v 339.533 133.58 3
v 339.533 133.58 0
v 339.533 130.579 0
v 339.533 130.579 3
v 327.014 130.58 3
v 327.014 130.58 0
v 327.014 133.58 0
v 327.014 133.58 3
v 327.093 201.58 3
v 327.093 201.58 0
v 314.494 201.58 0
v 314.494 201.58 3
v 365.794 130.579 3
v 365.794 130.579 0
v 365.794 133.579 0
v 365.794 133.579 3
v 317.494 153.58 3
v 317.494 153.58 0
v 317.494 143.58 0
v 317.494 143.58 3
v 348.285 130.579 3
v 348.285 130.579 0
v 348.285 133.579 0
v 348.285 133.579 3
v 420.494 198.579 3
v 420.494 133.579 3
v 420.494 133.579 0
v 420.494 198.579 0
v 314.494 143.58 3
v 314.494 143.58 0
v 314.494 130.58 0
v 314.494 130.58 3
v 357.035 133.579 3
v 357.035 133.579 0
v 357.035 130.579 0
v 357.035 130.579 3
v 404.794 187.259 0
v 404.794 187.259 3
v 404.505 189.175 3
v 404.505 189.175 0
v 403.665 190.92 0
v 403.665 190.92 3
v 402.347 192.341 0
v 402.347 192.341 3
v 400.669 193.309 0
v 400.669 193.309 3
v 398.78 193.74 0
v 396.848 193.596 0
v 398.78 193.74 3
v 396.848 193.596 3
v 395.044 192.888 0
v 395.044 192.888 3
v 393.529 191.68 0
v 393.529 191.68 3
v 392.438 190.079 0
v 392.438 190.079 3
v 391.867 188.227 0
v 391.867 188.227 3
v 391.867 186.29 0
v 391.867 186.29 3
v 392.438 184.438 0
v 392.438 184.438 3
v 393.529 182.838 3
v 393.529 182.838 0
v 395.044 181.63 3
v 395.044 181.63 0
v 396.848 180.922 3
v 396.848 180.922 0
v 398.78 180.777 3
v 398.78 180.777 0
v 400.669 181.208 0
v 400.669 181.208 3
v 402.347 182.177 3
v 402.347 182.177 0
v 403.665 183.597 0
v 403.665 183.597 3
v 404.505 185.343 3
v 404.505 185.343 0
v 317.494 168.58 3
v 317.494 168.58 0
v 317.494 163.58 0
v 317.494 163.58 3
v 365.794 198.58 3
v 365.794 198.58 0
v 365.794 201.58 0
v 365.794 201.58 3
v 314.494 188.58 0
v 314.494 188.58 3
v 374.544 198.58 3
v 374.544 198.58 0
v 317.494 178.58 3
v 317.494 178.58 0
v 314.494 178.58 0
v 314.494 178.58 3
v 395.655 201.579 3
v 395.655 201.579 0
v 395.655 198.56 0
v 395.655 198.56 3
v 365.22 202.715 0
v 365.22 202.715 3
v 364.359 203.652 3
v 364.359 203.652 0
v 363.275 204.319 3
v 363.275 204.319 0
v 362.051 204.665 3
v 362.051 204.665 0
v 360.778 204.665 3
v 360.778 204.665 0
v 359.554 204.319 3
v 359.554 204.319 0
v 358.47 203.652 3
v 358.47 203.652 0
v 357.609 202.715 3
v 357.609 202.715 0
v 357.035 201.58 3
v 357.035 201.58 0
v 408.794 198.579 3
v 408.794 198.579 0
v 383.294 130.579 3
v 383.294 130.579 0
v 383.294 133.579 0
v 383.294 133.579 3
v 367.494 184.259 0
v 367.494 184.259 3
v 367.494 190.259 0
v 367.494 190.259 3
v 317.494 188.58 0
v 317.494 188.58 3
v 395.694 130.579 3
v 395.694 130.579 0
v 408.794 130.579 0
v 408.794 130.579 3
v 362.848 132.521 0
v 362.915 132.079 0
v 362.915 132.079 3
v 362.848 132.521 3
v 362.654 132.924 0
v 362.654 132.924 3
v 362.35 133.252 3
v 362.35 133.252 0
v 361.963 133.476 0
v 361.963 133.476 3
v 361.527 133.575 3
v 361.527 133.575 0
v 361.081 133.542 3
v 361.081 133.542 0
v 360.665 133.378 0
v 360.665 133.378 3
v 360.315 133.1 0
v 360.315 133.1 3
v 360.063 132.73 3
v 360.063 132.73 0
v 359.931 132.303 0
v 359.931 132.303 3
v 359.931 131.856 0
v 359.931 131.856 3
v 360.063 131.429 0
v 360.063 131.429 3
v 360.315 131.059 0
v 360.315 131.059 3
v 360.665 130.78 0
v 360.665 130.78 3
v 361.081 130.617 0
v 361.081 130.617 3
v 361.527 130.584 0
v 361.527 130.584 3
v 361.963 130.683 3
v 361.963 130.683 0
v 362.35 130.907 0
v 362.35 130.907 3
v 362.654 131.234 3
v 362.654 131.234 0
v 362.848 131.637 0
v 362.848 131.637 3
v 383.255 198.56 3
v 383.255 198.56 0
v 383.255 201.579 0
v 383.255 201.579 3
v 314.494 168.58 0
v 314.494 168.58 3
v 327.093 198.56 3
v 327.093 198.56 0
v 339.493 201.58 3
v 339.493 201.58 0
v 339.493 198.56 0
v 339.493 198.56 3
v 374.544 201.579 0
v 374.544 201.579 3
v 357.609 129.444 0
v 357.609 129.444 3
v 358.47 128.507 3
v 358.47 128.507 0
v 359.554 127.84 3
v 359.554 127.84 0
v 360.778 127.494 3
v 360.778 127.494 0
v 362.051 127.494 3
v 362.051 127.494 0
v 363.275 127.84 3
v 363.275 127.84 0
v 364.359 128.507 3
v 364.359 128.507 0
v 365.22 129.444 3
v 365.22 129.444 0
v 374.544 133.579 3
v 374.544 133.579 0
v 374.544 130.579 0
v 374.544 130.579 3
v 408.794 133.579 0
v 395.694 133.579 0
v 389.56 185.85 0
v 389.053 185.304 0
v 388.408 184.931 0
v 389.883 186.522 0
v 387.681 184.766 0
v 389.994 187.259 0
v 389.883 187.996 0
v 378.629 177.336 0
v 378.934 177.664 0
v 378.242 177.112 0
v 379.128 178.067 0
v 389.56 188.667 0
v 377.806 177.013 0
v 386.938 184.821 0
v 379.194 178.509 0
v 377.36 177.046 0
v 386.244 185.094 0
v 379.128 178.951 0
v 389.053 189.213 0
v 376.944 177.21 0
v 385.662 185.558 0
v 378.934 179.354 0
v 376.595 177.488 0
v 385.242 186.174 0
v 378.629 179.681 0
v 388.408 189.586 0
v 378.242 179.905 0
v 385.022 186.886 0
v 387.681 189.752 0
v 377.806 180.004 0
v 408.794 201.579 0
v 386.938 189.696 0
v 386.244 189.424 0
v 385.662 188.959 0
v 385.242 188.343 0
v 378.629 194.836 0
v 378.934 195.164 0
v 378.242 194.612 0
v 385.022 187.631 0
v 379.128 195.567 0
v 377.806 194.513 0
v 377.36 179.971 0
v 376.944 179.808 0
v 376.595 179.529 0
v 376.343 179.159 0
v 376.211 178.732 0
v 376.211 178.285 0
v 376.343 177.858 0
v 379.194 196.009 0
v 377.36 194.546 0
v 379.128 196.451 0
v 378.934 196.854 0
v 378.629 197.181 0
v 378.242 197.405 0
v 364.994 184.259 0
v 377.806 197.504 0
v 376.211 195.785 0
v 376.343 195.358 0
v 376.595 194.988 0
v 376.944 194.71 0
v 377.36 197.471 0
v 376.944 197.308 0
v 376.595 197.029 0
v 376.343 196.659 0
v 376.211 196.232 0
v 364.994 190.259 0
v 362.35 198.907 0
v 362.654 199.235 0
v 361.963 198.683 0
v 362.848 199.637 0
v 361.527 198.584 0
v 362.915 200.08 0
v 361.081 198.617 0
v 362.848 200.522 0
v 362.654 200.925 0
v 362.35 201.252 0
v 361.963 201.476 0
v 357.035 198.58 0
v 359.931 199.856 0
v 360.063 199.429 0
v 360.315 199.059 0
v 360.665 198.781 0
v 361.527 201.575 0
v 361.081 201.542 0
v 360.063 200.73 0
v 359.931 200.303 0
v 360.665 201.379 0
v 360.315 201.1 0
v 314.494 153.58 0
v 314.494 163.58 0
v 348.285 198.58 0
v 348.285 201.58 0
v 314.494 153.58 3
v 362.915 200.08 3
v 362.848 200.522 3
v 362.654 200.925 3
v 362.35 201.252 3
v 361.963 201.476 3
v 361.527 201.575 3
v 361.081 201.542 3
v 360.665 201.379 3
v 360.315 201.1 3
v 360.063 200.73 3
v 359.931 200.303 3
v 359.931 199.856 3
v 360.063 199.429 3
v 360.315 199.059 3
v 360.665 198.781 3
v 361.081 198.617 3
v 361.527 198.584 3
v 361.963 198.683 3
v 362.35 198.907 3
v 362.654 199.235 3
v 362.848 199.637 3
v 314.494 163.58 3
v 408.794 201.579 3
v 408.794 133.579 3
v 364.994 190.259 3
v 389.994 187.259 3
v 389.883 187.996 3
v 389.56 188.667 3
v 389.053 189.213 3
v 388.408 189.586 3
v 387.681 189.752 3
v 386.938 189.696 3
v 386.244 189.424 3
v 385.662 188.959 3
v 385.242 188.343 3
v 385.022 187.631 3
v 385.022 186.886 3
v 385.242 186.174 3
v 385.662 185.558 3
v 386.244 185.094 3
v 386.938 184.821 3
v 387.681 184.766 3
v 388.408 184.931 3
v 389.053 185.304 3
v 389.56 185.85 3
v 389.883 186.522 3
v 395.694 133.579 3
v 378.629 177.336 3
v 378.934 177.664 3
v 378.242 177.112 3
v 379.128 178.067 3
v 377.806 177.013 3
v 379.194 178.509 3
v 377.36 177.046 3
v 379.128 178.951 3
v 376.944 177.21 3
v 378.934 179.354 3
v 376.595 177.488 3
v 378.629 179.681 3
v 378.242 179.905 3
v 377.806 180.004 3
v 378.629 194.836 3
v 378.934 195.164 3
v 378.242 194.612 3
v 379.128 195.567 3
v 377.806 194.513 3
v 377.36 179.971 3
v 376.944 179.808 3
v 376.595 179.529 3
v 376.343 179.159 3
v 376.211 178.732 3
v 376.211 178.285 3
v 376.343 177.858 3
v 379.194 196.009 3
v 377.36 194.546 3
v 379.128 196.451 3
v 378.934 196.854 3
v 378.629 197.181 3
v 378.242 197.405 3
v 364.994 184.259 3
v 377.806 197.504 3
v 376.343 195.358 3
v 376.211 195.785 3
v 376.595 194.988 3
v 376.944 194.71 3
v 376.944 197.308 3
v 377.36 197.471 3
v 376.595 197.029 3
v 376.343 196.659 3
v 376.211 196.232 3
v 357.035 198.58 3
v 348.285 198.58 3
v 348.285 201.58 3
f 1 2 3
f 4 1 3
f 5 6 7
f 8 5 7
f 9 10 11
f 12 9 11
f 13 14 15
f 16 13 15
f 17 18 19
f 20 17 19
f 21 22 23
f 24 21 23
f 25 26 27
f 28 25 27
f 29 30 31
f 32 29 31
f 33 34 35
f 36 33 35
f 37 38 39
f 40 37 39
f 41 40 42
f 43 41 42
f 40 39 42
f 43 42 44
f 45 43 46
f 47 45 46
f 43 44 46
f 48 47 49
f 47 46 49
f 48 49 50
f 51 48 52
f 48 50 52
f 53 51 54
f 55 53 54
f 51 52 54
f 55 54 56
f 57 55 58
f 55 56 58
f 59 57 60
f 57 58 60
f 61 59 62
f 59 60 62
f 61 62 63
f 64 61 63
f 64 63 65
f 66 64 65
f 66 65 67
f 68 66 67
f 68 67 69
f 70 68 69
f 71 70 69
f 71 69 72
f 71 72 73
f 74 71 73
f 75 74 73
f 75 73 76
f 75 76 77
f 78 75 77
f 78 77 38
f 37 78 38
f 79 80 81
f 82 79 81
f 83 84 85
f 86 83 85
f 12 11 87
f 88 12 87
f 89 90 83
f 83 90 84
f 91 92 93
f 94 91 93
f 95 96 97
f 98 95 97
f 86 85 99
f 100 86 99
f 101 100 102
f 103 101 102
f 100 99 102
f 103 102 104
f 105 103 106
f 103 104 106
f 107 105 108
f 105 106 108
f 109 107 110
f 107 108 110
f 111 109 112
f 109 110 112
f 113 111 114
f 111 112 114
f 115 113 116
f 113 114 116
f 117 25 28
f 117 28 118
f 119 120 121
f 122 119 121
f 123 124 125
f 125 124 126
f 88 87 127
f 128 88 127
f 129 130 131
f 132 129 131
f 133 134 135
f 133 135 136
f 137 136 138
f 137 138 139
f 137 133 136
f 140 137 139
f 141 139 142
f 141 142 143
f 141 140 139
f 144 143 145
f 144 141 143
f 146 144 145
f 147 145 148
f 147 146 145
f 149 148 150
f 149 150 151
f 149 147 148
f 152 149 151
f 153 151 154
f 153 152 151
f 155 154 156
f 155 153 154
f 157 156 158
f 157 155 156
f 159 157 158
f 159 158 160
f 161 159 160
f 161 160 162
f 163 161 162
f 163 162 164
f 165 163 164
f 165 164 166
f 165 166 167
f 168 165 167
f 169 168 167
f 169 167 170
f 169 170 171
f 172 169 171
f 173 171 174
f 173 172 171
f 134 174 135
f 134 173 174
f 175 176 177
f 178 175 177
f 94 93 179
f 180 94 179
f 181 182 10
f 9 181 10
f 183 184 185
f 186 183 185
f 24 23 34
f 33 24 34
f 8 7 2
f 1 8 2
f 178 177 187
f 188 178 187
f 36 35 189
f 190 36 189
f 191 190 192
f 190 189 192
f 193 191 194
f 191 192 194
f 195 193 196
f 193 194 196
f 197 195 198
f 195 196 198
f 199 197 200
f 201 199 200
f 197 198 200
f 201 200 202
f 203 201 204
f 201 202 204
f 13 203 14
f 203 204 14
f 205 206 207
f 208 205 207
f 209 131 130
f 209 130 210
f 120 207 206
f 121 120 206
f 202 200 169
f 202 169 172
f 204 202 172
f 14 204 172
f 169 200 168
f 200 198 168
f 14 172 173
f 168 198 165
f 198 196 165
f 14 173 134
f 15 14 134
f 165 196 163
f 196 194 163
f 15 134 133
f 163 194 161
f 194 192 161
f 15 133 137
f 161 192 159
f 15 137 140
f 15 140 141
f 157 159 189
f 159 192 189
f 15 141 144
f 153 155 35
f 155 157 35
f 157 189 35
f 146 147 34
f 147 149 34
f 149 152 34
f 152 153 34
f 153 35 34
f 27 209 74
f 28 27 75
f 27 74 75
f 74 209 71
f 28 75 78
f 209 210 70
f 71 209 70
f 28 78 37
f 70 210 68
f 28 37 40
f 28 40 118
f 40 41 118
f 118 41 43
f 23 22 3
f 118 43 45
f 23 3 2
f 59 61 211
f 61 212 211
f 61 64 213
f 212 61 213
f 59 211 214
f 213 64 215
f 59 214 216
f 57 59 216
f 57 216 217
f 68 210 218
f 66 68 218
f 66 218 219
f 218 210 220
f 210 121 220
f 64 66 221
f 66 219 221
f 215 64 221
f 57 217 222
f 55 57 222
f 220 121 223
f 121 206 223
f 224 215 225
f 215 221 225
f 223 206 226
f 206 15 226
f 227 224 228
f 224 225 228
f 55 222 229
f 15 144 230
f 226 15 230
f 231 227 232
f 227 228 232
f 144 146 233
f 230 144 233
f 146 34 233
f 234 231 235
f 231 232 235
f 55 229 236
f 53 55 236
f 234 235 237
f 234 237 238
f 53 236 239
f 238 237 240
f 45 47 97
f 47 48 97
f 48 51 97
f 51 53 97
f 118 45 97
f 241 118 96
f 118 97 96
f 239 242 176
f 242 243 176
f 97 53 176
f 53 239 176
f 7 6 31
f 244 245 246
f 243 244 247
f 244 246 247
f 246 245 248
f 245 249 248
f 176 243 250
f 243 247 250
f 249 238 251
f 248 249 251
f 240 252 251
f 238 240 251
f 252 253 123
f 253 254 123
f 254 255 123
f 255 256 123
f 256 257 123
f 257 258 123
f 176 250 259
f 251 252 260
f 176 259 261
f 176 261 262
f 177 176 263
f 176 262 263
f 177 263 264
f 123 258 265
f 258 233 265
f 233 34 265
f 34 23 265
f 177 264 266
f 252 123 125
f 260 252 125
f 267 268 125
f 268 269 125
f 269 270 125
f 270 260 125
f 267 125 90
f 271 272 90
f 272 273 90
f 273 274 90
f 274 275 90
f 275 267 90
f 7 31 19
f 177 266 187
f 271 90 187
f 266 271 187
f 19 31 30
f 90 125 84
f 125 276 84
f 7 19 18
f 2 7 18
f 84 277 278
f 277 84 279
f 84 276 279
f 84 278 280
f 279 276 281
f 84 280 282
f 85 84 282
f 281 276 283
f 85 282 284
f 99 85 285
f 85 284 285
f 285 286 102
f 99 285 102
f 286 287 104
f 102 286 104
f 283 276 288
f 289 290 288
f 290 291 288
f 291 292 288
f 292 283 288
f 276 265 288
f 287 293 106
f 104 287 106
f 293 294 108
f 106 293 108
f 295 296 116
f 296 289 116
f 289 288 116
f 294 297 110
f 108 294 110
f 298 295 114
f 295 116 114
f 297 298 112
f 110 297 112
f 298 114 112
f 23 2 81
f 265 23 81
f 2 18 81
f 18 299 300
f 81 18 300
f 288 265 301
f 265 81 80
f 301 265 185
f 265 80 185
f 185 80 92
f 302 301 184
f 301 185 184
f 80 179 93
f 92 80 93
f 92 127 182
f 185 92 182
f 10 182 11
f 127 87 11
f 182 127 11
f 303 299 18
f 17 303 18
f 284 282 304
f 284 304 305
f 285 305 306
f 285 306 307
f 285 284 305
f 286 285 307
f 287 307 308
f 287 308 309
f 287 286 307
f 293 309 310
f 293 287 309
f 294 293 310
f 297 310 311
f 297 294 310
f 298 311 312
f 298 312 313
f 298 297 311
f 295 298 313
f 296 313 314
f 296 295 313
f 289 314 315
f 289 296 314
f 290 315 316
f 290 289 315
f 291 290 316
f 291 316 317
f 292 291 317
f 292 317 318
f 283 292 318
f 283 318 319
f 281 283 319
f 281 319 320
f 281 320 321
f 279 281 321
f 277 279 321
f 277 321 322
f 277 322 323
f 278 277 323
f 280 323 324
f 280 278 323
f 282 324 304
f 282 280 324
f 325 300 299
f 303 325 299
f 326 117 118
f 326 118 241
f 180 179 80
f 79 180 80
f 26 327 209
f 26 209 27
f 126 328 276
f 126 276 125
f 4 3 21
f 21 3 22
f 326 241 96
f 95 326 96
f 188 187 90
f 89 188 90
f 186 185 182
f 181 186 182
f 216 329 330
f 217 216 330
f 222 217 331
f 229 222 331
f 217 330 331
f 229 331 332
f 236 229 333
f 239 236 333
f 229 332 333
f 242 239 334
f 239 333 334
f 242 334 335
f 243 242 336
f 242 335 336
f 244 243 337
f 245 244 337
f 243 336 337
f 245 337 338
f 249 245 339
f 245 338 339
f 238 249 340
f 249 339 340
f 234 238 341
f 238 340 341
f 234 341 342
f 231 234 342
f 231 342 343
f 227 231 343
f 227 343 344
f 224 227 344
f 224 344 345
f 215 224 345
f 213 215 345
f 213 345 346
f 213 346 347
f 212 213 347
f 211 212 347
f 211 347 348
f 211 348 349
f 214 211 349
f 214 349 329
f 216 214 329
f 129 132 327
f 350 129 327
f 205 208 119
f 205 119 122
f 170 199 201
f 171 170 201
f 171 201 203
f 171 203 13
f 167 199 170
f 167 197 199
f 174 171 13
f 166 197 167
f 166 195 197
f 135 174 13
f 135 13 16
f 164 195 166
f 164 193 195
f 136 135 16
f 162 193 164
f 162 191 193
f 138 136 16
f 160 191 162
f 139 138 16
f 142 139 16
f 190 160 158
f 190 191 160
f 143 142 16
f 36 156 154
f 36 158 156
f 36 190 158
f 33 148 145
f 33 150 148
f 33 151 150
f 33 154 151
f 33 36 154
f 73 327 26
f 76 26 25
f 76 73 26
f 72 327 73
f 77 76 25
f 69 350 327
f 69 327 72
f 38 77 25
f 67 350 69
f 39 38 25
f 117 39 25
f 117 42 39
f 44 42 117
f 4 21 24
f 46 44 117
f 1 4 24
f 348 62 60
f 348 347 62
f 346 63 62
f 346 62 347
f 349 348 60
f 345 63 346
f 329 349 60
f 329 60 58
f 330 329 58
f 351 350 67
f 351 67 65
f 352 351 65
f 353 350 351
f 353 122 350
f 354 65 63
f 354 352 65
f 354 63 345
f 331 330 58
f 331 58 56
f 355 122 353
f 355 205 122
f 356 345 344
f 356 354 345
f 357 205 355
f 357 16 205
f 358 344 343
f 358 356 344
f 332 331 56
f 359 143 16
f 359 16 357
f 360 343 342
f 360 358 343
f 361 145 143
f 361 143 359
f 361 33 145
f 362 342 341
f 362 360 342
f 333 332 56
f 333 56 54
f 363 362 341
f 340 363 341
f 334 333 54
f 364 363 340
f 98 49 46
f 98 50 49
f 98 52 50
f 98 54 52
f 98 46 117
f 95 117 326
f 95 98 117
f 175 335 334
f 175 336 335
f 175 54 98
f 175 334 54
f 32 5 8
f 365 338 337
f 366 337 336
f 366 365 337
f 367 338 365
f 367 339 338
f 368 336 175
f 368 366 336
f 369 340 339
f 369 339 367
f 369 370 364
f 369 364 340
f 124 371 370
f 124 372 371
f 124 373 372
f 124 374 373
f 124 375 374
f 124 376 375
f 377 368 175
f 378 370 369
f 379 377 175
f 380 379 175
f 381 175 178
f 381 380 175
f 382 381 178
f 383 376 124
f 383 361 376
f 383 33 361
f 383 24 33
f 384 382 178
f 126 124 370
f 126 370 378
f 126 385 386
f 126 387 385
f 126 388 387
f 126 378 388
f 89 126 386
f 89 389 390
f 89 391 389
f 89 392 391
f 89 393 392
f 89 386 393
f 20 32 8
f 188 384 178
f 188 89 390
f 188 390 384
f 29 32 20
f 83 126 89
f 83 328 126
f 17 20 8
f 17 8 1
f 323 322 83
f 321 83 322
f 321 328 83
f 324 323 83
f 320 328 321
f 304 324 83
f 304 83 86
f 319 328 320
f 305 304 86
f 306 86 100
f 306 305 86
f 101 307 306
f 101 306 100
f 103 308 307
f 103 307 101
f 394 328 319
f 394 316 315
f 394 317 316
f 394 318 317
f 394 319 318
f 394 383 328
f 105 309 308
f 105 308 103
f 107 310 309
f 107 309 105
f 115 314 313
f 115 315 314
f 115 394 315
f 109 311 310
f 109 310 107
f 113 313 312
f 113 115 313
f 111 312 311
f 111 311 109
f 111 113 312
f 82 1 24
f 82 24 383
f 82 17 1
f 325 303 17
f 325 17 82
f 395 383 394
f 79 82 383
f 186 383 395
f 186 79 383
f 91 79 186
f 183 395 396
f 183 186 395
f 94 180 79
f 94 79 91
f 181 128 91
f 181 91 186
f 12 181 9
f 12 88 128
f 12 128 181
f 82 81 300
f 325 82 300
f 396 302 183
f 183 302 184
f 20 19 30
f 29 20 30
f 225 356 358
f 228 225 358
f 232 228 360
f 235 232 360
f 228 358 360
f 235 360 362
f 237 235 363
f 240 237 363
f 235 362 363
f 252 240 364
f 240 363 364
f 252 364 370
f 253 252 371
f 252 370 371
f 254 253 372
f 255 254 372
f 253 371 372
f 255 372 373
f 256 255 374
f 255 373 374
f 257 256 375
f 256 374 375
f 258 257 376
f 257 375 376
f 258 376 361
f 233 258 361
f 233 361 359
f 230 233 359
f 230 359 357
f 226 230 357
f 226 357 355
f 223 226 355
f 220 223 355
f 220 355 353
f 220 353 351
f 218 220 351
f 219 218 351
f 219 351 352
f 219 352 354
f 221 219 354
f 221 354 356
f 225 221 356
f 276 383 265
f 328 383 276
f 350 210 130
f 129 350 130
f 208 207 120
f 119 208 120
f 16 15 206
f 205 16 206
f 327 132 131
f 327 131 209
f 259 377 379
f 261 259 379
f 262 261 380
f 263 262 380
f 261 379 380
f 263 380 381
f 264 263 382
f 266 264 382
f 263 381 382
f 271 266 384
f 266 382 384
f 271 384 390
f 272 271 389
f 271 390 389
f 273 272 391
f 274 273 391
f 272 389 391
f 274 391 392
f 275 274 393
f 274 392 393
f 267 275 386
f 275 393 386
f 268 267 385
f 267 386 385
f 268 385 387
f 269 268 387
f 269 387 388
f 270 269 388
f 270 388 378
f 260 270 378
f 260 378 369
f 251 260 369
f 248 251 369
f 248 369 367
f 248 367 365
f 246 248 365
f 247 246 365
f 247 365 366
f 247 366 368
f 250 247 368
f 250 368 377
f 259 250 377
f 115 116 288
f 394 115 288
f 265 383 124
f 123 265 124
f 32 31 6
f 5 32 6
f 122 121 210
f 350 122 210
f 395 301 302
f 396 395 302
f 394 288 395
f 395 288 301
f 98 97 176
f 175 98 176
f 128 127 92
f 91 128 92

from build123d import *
from OCP.BRepAlgoAPI import BRepAlgoAPI_Cut
from OCP.TopTools import TopTools_ListOfShape

# Parameters (mm, degrees)
CROQUIS1_R              = 1.500000001
SALIENTE_EXTRUIR1_DEPTH = 3
CROQUIS4_W              = 3
CROQUIS4_H              = 71.0001277
SALIENTE_EXTRUIR2_DEPTH = 15
CROQUIS5_R              = 6.5
CROQUIS5_R_2            = 1.5
CROQUIS5_R_3            = 2.5
CROQUIS5_W              = 2.499996062
CROQUIS5_H              = 6.000001641
CORTAR_EXTRUIR1_DEPTH   = 10
CORTAR_EXTRUIR3_START   = -4
CORTAR_EXTRUIR3_DEPTH   = 5
CROQUIS7_W              = 3
CROQUIS7_H              = 65.000131742
CORTAR_EXTRUIR4_DEPTH   = 9


with BuildPart() as part:
    # Croquis1 → Saliente-Extruir1 (new body)
    with BuildSketch(Plane.XY):
        with BuildLine():
            Line((314.494178041, 188.579504075), (317.494178043, 188.579506619))
            Line((317.494178043, 188.579506619), (317.494186524, 178.579506615))
            Line((317.494186524, 178.579506615), (314.494177731, 178.579504071))
            Line((314.494177731, 178.579504071), (314.494186212, 168.579504067))
            Line((314.494186212, 168.579504067), (317.494186214, 168.579506611))
            Line((317.494186214, 168.579506611), (317.494190454, 163.579648323))
            Line((317.494190454, 163.579648323), (314.494168474, 163.579645778))
            Line((314.494168474, 163.579645778), (314.494176956, 153.579645774))
            Line((314.494176956, 153.579645774), (317.494159374, 153.579648318))
            Line((317.494159374, 153.579648318), (317.494167855, 143.579648314))
            Line((317.494167855, 143.579648314), (314.494167854, 143.57964577))
            Line((314.494167854, 143.57964577), (314.494173605, 130.579645765))
            Line((314.494173605, 130.579645765), (327.013519861, 130.579618443))
            Line((327.013519861, 130.579618443), (327.013522591, 133.579618444))
            Line((327.013522591, 133.579618444), (339.532765197, 133.579591123))
            Line((339.532765197, 133.579591123), (339.532765197, 130.57943755))
            Line((339.532765197, 130.57943755), (348.284914925, 130.579428178))
            Line((348.284914925, 130.579428178), (348.284918137, 133.579395242))
            Line((348.284918137, 133.579395242), (357.034918141, 133.579385871))
            Line((357.034918141, 133.579385871), (357.034914928, 130.57938587))
            ThreePointArc((357.034914928, 130.57938587), (361.414562849, 127.449962294), (365.794217472, 130.57937649))
            Line((365.794217472, 130.57937649), (365.794220685, 133.579299126))
            Line((365.794220685, 133.579299126), (374.544220688, 133.579289756))
            Line((374.544220688, 133.579289756), (374.544217476, 130.579290106))
            Line((374.544217476, 130.579290106), (383.294100119, 130.579288157))
            Line((383.294100119, 130.579288157), (383.294100787, 133.579288158))
            Line((383.294100787, 133.579288158), (395.694123645, 133.579285396))
            Line((395.694123645, 133.579285396), (395.694122977, 130.579285394))
            Line((395.694122977, 130.579285394), (414.49422245, 130.579281206))
            Line((414.49422245, 130.579281206), (414.494175849, 201.579408906))
            Line((414.494175849, 201.579408906), (395.654796079, 201.579436111))
            Line((395.654796079, 201.579436111), (395.654796079, 198.559911251))
            Line((395.654796079, 198.559911251), (383.254781657, 198.559889448))
            Line((383.254781657, 198.559889448), (383.254781657, 201.579454018))
            Line((383.254781657, 201.579454018), (374.544176149, 201.579466597))
            Line((374.544176149, 201.579466597), (374.544170874, 198.579568646))
            Line((374.544170874, 198.579568646), (365.794170871, 198.579584031))
            Line((365.794170871, 198.579584031), (365.794176145, 201.579506668))
            ThreePointArc((365.794176145, 201.579506668), (361.414530376, 204.708933254), (357.034873601, 201.579522069))
            Line((357.034873601, 201.579522069), (357.034868326, 198.579522068))
            Line((357.034868326, 198.579522068), (348.284868323, 198.579537453))
            Line((348.284868323, 198.579537453), (348.284873598, 201.579504517))
            Line((348.284873598, 201.579504517), (339.493492813, 201.579517212))
            Line((339.493492813, 201.579517212), (339.493492813, 198.559812504))
            Line((339.493492813, 198.559812504), (327.093469951, 198.559790701))
            Line((327.093469951, 198.559790701), (327.093469951, 201.579535118))
            Line((327.093469951, 201.579535118), (314.494181082, 201.579553313))
            Line((314.494181082, 201.579553313), (314.494178041, 188.579504075))
        make_face()
        with Locations((361.414522236, 200.079542161)):
            Circle(CROQUIS1_R, mode=Mode.SUBTRACT)
        with Locations((361.414567806, 132.079353387)):
            Circle(CROQUIS1_R, mode=Mode.SUBTRACT)
    extrude(amount=SALIENTE_EXTRUIR1_DEPTH)

    # Croquis4 → Saliente-Extruir2 (add)
    with BuildSketch(Plane(origin=(414.494308155, 0.000272052, 0), x_dir=(0, 0, -1), z_dir=(0.9999999999997846, 6.563478556519826e-07, 0))):
        with Locations((-1.5, 166.079073004)):
            Rectangle(CROQUIS4_W, CROQUIS4_H)
    extrude(amount=SALIENTE_EXTRUIR2_DEPTH)

    # Croquis5 → Cortar-Extruir1 (cut)
    with BuildSketch(Plane.XY.offset(3)):
        with Locations((398.294185249, 187.258674364)):
            Circle(CROQUIS5_R)
        with Locations((377.694190992, 178.508660843)):
            Circle(CROQUIS5_R_2)
        with Locations((377.694179506, 196.008660843)):
            Circle(CROQUIS5_R_2)
        with Locations((387.494185249, 187.258667276)):
            Circle(CROQUIS5_R_3)
        with Locations((366.244185249, 187.258653329)):
            Rectangle(CROQUIS5_W, CROQUIS5_H)
    extrude(amount=-CORTAR_EXTRUIR1_DEPTH, mode=Mode.SUBTRACT)

    # Cortar-Extruir3: read off the stored shape, not the designer's step
    # Cortar-Extruir3 outline → Cortar-Extruir3 (cut)
    with BuildSketch(Plane(origin=(0, 0, 0), x_dir=(-1, 0, 0), z_dir=(0, 0, -1)).offset(CORTAR_EXTRUIR3_START)):
        Polygon((-429.494175849, 201.579418751), (-429.494177818, 198.579417138), (-408.794180476, 198.579417138), (-408.794180476, 201.579418751), (-414.494175849, 201.579408906), align=None)
        Polygon((-408.79422983, 133.579285396), (-429.49422245, 133.579285396), (-429.49422245, 130.579291051), (-414.49422245, 130.579281206), (-408.79422983, 130.579282476), align=None)
    extrude(amount=CORTAR_EXTRUIR3_DEPTH, mode=Mode.SUBTRACT)


with BuildPart() as cortar_extruir4_tool:
    # Croquis7 → Cortar-Extruir4 (new body)
    with BuildSketch(Plane(origin=(429.494308155, 0.000281898, 0), x_dir=(0, 0, -1), z_dir=(0.9999999999997846, 6.563478556519826e-07, 0))):
        with Locations((-1.5, 166.079069369)):
            Rectangle(CROQUIS7_W, CROQUIS7_H)
    extrude(amount=-CORTAR_EXTRUIR4_DEPTH)


with BuildPart() as part_1:
    add(part.part)

    # Cortar-Extruir4: cut by cortar_extruir4_tool, with a tolerance
    cortar_extruir4_stock = TopTools_ListOfShape()
    cortar_extruir4_stock.Append(part_1.part.wrapped)
    cortar_extruir4_tools = TopTools_ListOfShape()
    cortar_extruir4_tools.Append(cortar_extruir4_tool.part.wrapped)
    cortar_extruir4_cut = BRepAlgoAPI_Cut()
    cortar_extruir4_cut.SetArguments(cortar_extruir4_stock)
    cortar_extruir4_cut.SetTools(cortar_extruir4_tools)
    cortar_extruir4_cut.SetFuzzyValue(0.00001)
    cortar_extruir4_cut.Build()
    add(Compound.cast(cortar_extruir4_cut.Shape()).solids(), mode=Mode.REPLACE)


solid = part_1.part
